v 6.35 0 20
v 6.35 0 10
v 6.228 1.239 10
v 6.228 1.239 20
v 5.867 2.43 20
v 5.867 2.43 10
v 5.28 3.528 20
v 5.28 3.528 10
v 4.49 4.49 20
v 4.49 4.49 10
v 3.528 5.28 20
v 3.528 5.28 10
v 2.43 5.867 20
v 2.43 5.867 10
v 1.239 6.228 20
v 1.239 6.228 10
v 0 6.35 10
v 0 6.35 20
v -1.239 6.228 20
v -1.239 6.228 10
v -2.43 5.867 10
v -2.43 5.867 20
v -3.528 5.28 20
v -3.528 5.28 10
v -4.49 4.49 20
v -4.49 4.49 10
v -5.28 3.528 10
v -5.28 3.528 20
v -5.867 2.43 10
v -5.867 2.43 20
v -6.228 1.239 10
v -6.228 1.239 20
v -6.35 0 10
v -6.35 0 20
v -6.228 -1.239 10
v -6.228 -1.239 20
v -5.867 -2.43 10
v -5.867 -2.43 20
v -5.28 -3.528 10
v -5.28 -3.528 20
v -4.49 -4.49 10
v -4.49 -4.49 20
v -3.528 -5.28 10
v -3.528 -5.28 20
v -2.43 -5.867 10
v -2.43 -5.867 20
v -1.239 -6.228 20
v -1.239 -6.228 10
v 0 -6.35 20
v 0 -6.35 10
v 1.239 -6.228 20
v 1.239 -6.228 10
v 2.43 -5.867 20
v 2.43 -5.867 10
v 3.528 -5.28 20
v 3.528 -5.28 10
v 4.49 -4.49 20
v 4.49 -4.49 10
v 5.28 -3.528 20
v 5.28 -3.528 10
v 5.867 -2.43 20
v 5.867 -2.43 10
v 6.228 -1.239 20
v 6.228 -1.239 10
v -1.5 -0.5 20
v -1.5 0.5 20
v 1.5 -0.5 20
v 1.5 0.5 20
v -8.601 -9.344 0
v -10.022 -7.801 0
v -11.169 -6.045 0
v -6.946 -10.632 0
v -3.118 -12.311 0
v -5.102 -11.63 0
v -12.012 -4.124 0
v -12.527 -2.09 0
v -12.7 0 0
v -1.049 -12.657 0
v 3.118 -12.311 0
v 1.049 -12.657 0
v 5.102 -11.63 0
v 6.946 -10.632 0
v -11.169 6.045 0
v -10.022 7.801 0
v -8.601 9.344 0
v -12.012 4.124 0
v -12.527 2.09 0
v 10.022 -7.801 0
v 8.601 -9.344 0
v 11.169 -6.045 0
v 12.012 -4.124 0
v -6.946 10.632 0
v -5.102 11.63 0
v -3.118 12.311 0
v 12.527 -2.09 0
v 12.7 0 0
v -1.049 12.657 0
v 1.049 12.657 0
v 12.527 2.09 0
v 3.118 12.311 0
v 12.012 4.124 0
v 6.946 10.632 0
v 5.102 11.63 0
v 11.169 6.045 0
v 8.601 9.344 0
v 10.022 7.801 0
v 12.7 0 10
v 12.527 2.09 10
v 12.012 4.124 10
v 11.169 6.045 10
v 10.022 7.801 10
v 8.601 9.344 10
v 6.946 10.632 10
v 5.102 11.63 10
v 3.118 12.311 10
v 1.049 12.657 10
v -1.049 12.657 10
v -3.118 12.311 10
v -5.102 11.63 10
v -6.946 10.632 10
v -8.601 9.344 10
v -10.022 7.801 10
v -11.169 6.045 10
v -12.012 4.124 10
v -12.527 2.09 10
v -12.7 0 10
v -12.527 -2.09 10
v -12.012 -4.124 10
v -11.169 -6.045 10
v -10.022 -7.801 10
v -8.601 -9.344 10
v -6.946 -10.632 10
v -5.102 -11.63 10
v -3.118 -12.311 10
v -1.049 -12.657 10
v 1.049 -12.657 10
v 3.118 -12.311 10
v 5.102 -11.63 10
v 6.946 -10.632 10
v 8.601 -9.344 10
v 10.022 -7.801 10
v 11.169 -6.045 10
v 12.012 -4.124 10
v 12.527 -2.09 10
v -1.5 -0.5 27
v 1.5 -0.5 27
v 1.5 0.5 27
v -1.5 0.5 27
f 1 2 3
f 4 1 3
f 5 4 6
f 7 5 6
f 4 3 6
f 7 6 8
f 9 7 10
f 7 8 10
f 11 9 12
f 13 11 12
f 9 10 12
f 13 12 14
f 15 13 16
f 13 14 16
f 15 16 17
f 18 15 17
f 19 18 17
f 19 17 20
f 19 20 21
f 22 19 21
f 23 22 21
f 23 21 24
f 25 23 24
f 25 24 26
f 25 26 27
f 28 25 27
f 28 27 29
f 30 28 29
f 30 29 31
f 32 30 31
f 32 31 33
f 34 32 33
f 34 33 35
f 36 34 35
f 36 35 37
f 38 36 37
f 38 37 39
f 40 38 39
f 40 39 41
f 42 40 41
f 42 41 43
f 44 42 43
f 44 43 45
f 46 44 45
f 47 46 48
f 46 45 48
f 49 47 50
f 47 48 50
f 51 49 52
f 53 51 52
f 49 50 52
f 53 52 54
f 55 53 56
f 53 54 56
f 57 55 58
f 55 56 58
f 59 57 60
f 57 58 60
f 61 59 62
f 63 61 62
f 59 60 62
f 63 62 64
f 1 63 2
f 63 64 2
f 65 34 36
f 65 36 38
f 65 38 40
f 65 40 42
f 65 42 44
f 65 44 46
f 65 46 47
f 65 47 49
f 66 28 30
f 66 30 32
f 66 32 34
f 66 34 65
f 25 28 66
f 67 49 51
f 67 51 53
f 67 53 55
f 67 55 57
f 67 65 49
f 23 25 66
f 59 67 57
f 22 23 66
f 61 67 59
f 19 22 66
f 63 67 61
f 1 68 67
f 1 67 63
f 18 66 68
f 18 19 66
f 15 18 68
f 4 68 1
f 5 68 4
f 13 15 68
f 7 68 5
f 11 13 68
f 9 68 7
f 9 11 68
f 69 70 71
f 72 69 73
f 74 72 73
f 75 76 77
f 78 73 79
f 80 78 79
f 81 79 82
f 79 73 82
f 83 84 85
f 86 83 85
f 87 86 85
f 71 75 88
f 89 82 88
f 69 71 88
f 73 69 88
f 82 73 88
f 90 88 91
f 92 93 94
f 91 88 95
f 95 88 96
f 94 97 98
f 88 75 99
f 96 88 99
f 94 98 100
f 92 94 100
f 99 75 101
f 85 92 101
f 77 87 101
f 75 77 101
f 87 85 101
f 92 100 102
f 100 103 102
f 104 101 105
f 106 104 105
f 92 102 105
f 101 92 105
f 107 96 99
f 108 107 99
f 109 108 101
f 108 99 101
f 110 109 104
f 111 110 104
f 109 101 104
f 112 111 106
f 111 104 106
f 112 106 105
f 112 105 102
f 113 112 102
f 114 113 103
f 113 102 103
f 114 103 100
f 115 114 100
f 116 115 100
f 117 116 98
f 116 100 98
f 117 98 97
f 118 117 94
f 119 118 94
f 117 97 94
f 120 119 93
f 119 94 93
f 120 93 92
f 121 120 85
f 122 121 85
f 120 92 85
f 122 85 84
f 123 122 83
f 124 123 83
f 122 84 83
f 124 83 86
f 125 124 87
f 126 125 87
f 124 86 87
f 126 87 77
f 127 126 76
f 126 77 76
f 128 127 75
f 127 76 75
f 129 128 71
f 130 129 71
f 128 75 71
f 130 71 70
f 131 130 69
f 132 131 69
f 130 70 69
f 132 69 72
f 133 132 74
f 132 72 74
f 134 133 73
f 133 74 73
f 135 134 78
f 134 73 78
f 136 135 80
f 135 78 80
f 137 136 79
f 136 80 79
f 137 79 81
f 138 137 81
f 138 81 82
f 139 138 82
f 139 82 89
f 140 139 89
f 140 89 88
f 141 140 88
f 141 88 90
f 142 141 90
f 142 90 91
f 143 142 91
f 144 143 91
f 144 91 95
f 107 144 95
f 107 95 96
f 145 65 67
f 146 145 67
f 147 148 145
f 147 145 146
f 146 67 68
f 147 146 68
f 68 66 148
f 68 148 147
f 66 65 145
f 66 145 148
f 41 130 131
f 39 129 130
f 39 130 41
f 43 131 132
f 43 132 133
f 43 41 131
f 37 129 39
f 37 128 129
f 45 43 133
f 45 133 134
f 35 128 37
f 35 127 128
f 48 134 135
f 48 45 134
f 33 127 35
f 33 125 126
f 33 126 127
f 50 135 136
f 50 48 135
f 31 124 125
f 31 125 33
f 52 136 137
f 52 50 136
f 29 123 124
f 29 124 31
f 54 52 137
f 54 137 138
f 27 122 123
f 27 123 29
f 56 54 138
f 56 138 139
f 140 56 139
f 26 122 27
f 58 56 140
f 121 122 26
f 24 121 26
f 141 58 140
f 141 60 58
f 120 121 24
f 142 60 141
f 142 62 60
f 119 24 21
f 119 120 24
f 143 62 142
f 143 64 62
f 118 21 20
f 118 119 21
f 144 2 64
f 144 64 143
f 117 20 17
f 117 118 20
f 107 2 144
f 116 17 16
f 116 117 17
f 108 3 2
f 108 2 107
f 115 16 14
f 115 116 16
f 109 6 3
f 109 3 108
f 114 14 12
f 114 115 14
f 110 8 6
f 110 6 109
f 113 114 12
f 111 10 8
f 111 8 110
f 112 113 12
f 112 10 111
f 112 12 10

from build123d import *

# Parameters (mm, degrees)
F0_R     = 12.7
F0_R_2   = 6.35
F1_DEPTH = 10
F2_DEPTH = 20
F3_W     = 3
F3_H     = 1
F4_DEPTH = 7


with BuildPart() as f1:
    # F0 (on Top) → F1 (new body)
    with BuildSketch(Plane.XY):
        Circle(F0_R)
        Circle(F0_R_2, mode=Mode.SUBTRACT)
    extrude(amount=F1_DEPTH)

    # F0 (on Top) → F2 (join)
    with BuildSketch(Plane.XY):
        Circle(F0_R_2)
    extrude(amount=F2_DEPTH)

    # F3 (on face) → F4 (join)
    with BuildSketch(Plane.XY.offset(20)):
        Rectangle(F3_W, F3_H)
    extrude(amount=F4_DEPTH)


solid = f1.part
